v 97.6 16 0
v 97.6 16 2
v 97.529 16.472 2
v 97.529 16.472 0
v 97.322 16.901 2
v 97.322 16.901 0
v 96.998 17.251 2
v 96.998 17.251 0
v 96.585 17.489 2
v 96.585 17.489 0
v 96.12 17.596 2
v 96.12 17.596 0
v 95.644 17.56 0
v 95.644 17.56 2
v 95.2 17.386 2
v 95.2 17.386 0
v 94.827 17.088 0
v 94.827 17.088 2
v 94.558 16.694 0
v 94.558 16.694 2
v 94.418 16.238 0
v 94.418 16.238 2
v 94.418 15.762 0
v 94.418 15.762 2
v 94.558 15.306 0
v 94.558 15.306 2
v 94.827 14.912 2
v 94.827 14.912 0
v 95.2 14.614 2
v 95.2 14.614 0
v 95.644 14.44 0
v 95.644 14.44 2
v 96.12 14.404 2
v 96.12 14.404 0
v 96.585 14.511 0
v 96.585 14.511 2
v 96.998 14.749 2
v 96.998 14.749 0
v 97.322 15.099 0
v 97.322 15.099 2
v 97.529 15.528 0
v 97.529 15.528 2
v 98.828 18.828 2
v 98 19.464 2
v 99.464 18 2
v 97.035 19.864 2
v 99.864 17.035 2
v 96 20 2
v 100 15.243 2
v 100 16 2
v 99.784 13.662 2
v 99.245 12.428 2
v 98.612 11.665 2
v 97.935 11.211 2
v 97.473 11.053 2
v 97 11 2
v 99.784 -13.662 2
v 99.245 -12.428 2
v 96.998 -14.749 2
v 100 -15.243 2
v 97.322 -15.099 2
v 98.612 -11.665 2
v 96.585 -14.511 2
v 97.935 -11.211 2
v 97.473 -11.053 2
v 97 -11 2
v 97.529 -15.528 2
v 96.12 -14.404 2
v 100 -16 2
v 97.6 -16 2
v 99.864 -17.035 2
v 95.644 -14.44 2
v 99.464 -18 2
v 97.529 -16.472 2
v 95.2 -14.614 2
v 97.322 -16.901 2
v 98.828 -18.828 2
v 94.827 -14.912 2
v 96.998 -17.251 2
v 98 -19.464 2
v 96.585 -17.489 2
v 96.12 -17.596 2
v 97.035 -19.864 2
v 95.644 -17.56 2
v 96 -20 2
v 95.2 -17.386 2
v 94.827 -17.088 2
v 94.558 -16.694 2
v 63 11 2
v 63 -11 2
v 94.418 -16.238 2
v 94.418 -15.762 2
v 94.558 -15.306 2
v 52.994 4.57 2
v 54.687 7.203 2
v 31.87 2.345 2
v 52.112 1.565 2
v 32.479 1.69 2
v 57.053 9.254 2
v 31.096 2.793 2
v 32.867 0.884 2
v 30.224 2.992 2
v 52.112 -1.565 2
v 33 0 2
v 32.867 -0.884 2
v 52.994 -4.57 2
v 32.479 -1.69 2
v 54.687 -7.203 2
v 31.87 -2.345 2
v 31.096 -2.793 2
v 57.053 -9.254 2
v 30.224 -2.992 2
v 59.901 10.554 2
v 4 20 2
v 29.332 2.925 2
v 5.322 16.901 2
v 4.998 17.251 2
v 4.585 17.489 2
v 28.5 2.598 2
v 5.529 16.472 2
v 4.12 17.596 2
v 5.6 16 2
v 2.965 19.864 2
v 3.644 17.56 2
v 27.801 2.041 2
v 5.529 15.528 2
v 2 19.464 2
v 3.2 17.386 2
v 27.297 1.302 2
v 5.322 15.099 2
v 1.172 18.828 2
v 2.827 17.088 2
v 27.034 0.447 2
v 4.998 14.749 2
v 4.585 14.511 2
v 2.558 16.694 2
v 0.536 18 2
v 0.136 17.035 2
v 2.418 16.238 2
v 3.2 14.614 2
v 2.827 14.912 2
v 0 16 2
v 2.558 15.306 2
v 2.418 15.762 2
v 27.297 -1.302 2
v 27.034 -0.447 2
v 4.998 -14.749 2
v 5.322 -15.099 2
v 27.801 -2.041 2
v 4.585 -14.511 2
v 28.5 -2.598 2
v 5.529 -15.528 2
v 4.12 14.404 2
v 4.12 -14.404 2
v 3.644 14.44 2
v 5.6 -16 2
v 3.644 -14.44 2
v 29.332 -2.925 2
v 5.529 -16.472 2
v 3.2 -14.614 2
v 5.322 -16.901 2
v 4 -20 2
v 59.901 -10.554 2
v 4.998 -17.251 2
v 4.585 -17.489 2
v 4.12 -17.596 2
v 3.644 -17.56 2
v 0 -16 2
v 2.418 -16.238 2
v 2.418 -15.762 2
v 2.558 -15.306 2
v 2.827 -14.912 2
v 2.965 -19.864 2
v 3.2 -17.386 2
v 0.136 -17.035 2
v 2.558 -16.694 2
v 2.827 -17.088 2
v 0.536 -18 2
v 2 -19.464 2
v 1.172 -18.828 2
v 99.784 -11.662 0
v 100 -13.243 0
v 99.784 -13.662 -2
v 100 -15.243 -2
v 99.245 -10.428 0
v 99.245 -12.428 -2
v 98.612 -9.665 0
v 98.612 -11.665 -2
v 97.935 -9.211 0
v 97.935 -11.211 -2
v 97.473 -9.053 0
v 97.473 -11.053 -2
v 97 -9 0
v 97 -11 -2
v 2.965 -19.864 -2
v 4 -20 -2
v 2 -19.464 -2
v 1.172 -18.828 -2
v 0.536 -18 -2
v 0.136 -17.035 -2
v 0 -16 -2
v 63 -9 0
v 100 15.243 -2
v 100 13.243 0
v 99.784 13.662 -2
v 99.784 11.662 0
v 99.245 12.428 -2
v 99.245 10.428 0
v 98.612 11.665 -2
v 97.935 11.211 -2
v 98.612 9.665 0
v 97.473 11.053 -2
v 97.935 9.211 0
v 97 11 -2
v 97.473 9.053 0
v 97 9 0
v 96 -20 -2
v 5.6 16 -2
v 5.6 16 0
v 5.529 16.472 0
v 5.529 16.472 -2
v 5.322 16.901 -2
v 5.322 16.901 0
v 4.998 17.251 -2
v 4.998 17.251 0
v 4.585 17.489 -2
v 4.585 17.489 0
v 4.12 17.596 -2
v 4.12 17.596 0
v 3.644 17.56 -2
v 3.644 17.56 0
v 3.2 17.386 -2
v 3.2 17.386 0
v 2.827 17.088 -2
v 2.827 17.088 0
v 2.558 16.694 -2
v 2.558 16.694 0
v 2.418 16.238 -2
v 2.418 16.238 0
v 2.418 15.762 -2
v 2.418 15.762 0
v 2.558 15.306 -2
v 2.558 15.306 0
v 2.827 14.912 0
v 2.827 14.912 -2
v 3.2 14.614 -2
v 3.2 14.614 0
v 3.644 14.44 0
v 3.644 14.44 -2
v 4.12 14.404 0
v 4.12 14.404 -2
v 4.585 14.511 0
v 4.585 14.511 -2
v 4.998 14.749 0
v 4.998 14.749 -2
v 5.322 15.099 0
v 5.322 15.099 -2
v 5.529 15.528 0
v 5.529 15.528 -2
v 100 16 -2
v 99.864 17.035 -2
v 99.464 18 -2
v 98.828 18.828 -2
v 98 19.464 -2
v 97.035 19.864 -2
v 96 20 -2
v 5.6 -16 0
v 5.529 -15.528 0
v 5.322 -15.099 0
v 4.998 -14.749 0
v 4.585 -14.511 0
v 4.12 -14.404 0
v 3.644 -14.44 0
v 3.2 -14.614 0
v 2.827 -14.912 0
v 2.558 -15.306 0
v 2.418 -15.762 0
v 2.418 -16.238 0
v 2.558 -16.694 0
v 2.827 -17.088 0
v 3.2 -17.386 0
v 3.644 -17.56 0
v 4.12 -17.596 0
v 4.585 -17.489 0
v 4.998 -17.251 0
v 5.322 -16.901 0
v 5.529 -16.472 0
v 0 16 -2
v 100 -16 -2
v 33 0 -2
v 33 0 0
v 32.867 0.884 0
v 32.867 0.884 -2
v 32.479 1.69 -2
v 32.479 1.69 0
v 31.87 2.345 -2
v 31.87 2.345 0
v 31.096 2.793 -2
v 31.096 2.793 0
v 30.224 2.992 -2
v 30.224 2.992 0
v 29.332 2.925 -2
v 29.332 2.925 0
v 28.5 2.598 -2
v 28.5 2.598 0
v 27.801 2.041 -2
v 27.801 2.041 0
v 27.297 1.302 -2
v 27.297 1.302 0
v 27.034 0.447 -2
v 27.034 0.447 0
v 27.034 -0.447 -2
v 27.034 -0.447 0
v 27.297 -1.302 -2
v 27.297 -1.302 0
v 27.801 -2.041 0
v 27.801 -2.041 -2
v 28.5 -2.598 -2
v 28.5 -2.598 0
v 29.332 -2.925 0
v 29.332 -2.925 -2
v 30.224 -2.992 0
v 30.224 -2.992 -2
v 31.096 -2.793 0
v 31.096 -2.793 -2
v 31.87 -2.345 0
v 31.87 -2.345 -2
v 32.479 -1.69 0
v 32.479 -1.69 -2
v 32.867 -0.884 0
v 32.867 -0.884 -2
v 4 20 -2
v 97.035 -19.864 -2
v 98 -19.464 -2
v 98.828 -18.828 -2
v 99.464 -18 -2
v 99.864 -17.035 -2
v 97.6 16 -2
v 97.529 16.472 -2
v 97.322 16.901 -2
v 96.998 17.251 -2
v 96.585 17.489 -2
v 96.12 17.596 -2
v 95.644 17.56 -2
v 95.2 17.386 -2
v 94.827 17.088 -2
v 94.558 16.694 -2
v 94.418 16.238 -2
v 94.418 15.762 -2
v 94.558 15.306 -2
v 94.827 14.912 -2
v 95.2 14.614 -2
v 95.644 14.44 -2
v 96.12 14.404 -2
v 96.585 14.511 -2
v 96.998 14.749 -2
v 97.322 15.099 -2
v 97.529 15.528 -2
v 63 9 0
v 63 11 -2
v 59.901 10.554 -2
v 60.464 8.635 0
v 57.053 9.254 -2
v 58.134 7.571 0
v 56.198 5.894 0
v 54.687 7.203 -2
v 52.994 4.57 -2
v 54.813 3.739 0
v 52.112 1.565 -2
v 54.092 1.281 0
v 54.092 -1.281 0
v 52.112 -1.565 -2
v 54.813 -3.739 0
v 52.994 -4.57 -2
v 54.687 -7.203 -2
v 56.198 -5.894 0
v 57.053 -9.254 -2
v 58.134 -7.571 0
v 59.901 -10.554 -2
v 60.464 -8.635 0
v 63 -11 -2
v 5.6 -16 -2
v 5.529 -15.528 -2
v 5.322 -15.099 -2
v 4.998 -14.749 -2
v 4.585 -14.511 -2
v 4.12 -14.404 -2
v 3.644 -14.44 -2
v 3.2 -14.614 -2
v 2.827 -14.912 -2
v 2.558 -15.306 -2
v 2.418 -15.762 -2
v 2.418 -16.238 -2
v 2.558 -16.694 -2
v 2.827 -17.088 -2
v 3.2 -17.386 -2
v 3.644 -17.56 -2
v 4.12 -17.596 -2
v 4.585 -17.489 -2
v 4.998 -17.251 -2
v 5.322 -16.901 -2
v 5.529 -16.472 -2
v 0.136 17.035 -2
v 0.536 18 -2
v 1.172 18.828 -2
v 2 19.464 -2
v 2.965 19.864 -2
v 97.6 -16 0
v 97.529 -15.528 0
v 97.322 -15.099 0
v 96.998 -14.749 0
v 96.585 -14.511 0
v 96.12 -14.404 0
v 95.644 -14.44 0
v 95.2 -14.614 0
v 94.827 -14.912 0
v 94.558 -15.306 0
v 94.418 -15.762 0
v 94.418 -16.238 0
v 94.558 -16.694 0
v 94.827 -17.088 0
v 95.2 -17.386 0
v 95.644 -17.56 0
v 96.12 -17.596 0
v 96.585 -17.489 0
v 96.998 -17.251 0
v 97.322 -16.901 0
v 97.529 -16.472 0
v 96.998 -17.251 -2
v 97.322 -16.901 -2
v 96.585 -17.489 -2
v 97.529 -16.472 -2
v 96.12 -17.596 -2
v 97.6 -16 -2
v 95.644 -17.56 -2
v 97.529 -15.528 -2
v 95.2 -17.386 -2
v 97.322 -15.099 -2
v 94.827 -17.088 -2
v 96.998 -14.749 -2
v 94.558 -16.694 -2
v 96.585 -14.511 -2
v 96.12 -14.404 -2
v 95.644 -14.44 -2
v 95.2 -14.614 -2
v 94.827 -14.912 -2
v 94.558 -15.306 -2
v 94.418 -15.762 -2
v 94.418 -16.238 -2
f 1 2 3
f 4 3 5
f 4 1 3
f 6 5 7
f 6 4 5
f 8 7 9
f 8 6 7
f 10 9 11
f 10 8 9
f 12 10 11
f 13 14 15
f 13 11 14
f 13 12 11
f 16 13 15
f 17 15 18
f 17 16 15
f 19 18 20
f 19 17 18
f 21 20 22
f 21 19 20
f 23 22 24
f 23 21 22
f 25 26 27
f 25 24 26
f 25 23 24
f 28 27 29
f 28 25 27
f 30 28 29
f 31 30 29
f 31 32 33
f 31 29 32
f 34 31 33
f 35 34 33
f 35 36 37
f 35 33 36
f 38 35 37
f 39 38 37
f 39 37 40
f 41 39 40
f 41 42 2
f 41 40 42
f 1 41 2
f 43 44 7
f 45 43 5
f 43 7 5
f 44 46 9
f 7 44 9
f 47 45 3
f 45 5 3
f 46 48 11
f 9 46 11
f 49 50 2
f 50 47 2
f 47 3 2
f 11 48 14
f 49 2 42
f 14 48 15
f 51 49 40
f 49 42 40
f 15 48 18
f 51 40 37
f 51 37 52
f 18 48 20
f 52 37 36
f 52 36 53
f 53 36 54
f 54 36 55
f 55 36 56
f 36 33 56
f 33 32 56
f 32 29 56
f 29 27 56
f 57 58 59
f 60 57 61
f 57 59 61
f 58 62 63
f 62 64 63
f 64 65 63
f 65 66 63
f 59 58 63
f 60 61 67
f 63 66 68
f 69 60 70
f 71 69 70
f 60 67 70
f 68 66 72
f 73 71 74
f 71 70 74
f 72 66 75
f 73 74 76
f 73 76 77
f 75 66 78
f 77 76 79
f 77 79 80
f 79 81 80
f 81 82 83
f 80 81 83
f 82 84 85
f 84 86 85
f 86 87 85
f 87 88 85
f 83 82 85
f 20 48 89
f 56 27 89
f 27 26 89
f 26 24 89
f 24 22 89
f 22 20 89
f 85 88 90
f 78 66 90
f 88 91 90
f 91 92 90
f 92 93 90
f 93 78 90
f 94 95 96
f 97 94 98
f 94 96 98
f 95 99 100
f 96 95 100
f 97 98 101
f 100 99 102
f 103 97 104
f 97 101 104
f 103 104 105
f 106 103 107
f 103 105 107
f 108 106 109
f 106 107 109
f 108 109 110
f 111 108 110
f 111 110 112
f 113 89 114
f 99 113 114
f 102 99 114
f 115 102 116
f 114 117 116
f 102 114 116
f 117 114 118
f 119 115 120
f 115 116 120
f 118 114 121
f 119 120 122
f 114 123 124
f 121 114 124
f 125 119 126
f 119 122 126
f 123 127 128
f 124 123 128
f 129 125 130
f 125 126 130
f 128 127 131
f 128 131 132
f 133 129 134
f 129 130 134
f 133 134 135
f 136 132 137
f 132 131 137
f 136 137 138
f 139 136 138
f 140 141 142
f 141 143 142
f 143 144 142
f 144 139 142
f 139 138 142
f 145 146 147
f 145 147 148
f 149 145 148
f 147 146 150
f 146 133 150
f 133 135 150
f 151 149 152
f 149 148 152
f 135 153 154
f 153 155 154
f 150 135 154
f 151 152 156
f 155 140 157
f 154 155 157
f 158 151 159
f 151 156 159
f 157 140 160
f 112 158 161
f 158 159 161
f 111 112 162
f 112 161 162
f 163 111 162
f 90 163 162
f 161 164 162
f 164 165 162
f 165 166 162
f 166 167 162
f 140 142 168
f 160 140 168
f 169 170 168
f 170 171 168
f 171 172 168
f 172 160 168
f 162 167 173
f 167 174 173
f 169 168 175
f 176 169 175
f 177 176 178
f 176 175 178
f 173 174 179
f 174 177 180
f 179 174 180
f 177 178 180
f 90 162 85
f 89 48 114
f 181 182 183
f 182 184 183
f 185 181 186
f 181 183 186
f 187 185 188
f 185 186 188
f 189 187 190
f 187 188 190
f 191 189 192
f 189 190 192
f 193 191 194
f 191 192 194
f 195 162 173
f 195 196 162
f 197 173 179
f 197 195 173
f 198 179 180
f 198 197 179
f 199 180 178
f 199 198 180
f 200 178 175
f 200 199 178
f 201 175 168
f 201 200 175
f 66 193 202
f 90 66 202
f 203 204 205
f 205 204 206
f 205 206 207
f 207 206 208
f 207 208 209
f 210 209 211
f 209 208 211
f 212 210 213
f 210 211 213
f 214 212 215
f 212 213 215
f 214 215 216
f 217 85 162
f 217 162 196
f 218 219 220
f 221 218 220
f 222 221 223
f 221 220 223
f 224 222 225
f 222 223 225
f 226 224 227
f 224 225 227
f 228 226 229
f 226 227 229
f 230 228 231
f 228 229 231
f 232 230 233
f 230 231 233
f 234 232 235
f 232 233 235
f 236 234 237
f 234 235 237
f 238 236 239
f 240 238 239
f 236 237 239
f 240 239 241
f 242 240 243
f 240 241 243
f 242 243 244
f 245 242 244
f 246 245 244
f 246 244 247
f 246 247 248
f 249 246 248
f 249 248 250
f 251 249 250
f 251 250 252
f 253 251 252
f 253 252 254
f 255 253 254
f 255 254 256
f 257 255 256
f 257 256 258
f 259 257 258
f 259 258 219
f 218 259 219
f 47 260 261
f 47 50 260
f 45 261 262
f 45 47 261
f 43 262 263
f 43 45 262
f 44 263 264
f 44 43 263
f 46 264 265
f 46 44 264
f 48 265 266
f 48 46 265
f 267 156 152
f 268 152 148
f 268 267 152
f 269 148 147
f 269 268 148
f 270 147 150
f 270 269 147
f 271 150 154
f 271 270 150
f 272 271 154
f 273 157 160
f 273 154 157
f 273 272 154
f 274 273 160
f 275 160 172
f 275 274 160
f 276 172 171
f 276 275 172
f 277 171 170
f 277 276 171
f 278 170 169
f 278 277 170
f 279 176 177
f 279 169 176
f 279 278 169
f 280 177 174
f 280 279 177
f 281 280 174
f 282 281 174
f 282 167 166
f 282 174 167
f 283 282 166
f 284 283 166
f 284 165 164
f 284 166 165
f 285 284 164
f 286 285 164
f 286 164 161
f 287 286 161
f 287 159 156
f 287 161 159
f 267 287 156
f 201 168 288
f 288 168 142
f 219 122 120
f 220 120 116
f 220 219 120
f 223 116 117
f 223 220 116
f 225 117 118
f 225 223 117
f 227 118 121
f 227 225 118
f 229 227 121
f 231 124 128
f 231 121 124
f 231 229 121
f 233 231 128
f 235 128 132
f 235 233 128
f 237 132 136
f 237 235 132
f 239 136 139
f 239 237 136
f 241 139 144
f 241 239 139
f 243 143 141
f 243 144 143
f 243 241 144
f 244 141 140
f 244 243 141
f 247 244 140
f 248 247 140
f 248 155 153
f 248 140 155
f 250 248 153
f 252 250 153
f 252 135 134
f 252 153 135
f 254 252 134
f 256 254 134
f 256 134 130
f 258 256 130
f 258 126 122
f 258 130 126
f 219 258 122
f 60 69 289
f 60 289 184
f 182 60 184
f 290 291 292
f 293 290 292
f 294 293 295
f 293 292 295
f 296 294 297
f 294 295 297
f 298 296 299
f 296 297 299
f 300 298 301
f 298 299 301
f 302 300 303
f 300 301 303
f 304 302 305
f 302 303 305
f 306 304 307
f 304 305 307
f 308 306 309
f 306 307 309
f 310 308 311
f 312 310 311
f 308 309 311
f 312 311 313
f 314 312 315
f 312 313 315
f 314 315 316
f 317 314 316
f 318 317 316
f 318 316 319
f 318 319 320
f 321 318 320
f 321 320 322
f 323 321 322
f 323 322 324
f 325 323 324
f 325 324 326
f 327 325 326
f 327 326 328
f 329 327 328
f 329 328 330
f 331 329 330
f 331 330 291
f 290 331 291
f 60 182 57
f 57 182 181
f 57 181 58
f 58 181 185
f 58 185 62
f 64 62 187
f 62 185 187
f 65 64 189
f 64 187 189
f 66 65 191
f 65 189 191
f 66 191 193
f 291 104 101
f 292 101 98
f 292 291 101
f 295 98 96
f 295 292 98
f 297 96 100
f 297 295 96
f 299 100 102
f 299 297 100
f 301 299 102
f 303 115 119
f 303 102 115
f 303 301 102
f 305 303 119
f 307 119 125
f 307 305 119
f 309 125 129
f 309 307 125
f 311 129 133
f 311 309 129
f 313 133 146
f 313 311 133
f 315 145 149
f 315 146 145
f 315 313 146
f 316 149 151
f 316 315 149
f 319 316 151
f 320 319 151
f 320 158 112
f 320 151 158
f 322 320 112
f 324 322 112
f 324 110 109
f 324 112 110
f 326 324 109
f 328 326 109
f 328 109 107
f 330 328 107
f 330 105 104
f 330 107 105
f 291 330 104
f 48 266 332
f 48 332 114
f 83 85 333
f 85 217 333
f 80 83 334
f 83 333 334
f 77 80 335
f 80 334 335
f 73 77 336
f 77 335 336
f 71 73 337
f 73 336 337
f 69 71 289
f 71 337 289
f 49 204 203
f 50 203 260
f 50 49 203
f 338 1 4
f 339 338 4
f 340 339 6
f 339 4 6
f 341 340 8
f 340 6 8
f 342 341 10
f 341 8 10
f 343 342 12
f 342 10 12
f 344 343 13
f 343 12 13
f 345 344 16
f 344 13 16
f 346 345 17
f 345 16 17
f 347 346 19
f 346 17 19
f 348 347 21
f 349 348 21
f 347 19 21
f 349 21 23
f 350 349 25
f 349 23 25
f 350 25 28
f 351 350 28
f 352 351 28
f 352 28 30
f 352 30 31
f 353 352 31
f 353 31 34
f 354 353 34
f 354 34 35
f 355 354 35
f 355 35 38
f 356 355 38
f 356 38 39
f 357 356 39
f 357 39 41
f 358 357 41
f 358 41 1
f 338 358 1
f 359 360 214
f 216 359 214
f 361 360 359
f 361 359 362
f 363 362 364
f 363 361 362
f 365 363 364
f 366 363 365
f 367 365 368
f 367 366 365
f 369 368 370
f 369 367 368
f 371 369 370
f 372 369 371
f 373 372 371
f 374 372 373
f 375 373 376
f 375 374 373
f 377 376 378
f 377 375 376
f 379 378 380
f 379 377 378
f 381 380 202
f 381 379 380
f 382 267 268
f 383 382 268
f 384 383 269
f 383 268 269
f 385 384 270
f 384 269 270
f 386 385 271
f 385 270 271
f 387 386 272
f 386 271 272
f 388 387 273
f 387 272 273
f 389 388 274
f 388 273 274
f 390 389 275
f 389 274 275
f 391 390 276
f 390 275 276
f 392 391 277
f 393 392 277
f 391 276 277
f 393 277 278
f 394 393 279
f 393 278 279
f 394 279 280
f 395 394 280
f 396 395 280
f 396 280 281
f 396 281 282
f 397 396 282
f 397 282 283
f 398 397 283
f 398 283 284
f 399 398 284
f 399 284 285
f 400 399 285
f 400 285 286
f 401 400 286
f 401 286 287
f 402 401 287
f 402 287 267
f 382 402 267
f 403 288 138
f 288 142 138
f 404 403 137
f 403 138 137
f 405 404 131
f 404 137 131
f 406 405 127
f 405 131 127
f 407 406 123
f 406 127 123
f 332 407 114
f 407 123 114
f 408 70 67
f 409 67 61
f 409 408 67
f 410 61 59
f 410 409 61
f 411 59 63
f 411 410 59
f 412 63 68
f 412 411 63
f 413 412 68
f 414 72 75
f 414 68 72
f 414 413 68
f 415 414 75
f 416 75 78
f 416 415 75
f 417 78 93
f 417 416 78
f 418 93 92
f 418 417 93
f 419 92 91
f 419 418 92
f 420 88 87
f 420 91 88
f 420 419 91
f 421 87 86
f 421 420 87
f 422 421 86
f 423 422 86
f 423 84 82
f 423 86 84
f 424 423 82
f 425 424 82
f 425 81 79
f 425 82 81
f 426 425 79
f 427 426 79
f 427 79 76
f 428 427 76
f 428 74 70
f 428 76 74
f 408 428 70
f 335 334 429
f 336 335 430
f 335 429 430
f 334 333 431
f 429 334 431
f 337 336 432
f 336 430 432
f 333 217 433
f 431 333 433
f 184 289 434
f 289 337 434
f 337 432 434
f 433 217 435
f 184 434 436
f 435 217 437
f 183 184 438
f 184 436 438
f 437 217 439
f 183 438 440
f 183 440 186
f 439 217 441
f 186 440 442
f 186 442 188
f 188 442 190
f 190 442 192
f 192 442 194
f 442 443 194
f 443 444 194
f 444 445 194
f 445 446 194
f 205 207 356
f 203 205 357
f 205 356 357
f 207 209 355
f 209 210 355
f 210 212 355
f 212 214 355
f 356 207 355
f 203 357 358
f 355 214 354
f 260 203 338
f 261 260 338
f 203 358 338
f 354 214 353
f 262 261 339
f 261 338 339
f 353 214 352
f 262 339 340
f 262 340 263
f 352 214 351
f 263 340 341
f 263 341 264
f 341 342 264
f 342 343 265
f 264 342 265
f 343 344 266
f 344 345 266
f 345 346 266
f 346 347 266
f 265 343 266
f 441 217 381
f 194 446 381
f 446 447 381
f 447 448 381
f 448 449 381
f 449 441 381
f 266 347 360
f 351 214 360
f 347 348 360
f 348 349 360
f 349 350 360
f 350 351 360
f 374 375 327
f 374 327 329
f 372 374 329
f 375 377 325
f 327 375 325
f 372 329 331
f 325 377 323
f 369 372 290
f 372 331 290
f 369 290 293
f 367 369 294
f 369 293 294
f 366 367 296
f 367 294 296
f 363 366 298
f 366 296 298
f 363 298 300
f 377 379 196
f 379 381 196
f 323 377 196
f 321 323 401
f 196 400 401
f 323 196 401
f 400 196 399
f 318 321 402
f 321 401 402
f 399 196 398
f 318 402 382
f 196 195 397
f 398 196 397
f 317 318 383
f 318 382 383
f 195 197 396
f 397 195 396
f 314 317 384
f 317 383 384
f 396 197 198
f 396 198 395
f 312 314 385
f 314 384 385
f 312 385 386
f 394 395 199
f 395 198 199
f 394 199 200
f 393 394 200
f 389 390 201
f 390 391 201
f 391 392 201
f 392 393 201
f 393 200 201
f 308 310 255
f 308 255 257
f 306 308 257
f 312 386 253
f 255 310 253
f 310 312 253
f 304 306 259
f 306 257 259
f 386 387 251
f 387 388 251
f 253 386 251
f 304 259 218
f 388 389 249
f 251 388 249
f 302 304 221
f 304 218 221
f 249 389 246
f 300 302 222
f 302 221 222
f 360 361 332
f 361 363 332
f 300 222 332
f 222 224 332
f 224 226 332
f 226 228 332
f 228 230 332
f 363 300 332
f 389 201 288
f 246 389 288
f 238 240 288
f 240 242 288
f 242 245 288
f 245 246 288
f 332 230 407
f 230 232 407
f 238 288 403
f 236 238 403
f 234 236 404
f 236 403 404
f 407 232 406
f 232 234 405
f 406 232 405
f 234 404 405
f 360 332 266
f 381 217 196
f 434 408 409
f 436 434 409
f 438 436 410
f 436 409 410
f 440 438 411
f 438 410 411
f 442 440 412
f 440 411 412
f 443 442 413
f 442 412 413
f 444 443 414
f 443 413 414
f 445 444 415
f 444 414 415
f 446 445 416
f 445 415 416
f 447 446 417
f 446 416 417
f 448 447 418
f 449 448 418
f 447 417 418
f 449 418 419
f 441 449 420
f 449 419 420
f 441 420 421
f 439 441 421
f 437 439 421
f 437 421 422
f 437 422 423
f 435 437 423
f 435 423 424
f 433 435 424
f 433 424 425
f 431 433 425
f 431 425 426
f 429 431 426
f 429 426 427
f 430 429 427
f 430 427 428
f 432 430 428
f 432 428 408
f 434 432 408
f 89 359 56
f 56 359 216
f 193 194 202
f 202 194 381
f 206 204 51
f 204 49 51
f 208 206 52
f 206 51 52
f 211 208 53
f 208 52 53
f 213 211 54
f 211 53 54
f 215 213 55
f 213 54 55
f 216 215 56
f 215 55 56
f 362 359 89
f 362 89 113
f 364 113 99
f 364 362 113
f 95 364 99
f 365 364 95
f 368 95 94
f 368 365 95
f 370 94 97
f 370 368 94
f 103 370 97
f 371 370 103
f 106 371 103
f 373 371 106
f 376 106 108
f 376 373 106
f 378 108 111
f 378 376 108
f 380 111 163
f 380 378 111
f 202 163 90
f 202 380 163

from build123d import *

# Parameters (mm, degrees)
PAD_DEPTH         = 100
SKETCH001_R       = 3
SKETCH001_R_2     = 1.6
POCKET_DEPTH      = 2.001
POCKET_DEPTH_BACK = 2.001
SKETCH004_R       = 11
SKETCH003_R       = 9
SKETCH005_R       = 11
FILLET_R          = 4
FILLET001_R       = 3


with BuildPart() as part:
    # Sketch → Pad (new body)
    with BuildSketch(Plane.YZ):
        Polygon((0, 2), (-20, 2), (-20, 0), (-20, -2), (0, -2), (20, -2), (20, 0), (20, 2), align=None)
    extrude(amount=PAD_DEPTH)

    # Sketch001 → Pocket (cut, two sides)
    with BuildSketch(Plane.XY) as pocket_sk:
        with Locations((30, 0)):
            Circle(SKETCH001_R)
        with Locations((4, 16)):
            Circle(SKETCH001_R_2)
        with Locations((4, -16)):
            Circle(SKETCH001_R_2)
        with Locations((96, 16)):
            Circle(SKETCH001_R_2)
        with Locations((96, -16)):
            Circle(SKETCH001_R_2)
    extrude(amount=-POCKET_DEPTH, mode=Mode.SUBTRACT)
    extrude(pocket_sk.sketch, amount=POCKET_DEPTH_BACK, mode=Mode.SUBTRACT)

    # Sketch004 (on DatumPlane) → SubtractiveLoft section 0
    with BuildSketch(Plane.XY.offset(2)):
        with Locations((63, 0)):
            Circle(SKETCH004_R)
    # Sketch003 → SubtractiveLoft section 1
    with BuildSketch(Plane.XY):
        with Locations((63, 0)):
            Circle(SKETCH003_R)
    # Sketch005 (on DatumPlane) → SubtractiveLoft section 2
    with BuildSketch(Plane.XY.offset(-2)):
        with Locations((63, 0)):
            Circle(SKETCH005_R)
    loft(ruled=True, mode=Mode.SUBTRACT)

    # Sketch007 (on DatumPlane) → SubtractiveLoft001 section 0
    with BuildSketch(Plane.XY.offset(2)):
        Polygon((63, 0), (63, 11), (113, 11), (113, -11), (63, -11), align=None)
    # Sketch006 → SubtractiveLoft001 section 1
    with BuildSketch(Plane.XY):
        Polygon((63, 0), (63, 9), (113, 9), (113, -9), (63, -9), align=None)
    # Sketch008 (on DatumPlane) → SubtractiveLoft001 section 2
    with BuildSketch(Plane.XY.offset(-2)):
        Polygon((63, 11), (63, 0), (63, -11), (113, -11), (113, 11), align=None)
    loft(ruled=True, mode=Mode.SUBTRACT)

    # Fillet
    fillet_edges = [part.edges().sort_by_distance(p)[0] for p in [
        (100, -20, 1),
        (100, 20, 1),
        (0, 20, 1),
        (0, -20, 1),
    ]]
    fillet(fillet_edges, radius=FILLET_R)

    # Fillet001
    fillet001_edges = [part.edges().sort_by_distance(p)[0] for p in [
        (100, -10, 1),
        (100, -10, -1),
        (100, 10, 1),
        (100, 10, -1),
    ]]
    fillet(fillet001_edges, radius=FILLET001_R)


solid = part.part
